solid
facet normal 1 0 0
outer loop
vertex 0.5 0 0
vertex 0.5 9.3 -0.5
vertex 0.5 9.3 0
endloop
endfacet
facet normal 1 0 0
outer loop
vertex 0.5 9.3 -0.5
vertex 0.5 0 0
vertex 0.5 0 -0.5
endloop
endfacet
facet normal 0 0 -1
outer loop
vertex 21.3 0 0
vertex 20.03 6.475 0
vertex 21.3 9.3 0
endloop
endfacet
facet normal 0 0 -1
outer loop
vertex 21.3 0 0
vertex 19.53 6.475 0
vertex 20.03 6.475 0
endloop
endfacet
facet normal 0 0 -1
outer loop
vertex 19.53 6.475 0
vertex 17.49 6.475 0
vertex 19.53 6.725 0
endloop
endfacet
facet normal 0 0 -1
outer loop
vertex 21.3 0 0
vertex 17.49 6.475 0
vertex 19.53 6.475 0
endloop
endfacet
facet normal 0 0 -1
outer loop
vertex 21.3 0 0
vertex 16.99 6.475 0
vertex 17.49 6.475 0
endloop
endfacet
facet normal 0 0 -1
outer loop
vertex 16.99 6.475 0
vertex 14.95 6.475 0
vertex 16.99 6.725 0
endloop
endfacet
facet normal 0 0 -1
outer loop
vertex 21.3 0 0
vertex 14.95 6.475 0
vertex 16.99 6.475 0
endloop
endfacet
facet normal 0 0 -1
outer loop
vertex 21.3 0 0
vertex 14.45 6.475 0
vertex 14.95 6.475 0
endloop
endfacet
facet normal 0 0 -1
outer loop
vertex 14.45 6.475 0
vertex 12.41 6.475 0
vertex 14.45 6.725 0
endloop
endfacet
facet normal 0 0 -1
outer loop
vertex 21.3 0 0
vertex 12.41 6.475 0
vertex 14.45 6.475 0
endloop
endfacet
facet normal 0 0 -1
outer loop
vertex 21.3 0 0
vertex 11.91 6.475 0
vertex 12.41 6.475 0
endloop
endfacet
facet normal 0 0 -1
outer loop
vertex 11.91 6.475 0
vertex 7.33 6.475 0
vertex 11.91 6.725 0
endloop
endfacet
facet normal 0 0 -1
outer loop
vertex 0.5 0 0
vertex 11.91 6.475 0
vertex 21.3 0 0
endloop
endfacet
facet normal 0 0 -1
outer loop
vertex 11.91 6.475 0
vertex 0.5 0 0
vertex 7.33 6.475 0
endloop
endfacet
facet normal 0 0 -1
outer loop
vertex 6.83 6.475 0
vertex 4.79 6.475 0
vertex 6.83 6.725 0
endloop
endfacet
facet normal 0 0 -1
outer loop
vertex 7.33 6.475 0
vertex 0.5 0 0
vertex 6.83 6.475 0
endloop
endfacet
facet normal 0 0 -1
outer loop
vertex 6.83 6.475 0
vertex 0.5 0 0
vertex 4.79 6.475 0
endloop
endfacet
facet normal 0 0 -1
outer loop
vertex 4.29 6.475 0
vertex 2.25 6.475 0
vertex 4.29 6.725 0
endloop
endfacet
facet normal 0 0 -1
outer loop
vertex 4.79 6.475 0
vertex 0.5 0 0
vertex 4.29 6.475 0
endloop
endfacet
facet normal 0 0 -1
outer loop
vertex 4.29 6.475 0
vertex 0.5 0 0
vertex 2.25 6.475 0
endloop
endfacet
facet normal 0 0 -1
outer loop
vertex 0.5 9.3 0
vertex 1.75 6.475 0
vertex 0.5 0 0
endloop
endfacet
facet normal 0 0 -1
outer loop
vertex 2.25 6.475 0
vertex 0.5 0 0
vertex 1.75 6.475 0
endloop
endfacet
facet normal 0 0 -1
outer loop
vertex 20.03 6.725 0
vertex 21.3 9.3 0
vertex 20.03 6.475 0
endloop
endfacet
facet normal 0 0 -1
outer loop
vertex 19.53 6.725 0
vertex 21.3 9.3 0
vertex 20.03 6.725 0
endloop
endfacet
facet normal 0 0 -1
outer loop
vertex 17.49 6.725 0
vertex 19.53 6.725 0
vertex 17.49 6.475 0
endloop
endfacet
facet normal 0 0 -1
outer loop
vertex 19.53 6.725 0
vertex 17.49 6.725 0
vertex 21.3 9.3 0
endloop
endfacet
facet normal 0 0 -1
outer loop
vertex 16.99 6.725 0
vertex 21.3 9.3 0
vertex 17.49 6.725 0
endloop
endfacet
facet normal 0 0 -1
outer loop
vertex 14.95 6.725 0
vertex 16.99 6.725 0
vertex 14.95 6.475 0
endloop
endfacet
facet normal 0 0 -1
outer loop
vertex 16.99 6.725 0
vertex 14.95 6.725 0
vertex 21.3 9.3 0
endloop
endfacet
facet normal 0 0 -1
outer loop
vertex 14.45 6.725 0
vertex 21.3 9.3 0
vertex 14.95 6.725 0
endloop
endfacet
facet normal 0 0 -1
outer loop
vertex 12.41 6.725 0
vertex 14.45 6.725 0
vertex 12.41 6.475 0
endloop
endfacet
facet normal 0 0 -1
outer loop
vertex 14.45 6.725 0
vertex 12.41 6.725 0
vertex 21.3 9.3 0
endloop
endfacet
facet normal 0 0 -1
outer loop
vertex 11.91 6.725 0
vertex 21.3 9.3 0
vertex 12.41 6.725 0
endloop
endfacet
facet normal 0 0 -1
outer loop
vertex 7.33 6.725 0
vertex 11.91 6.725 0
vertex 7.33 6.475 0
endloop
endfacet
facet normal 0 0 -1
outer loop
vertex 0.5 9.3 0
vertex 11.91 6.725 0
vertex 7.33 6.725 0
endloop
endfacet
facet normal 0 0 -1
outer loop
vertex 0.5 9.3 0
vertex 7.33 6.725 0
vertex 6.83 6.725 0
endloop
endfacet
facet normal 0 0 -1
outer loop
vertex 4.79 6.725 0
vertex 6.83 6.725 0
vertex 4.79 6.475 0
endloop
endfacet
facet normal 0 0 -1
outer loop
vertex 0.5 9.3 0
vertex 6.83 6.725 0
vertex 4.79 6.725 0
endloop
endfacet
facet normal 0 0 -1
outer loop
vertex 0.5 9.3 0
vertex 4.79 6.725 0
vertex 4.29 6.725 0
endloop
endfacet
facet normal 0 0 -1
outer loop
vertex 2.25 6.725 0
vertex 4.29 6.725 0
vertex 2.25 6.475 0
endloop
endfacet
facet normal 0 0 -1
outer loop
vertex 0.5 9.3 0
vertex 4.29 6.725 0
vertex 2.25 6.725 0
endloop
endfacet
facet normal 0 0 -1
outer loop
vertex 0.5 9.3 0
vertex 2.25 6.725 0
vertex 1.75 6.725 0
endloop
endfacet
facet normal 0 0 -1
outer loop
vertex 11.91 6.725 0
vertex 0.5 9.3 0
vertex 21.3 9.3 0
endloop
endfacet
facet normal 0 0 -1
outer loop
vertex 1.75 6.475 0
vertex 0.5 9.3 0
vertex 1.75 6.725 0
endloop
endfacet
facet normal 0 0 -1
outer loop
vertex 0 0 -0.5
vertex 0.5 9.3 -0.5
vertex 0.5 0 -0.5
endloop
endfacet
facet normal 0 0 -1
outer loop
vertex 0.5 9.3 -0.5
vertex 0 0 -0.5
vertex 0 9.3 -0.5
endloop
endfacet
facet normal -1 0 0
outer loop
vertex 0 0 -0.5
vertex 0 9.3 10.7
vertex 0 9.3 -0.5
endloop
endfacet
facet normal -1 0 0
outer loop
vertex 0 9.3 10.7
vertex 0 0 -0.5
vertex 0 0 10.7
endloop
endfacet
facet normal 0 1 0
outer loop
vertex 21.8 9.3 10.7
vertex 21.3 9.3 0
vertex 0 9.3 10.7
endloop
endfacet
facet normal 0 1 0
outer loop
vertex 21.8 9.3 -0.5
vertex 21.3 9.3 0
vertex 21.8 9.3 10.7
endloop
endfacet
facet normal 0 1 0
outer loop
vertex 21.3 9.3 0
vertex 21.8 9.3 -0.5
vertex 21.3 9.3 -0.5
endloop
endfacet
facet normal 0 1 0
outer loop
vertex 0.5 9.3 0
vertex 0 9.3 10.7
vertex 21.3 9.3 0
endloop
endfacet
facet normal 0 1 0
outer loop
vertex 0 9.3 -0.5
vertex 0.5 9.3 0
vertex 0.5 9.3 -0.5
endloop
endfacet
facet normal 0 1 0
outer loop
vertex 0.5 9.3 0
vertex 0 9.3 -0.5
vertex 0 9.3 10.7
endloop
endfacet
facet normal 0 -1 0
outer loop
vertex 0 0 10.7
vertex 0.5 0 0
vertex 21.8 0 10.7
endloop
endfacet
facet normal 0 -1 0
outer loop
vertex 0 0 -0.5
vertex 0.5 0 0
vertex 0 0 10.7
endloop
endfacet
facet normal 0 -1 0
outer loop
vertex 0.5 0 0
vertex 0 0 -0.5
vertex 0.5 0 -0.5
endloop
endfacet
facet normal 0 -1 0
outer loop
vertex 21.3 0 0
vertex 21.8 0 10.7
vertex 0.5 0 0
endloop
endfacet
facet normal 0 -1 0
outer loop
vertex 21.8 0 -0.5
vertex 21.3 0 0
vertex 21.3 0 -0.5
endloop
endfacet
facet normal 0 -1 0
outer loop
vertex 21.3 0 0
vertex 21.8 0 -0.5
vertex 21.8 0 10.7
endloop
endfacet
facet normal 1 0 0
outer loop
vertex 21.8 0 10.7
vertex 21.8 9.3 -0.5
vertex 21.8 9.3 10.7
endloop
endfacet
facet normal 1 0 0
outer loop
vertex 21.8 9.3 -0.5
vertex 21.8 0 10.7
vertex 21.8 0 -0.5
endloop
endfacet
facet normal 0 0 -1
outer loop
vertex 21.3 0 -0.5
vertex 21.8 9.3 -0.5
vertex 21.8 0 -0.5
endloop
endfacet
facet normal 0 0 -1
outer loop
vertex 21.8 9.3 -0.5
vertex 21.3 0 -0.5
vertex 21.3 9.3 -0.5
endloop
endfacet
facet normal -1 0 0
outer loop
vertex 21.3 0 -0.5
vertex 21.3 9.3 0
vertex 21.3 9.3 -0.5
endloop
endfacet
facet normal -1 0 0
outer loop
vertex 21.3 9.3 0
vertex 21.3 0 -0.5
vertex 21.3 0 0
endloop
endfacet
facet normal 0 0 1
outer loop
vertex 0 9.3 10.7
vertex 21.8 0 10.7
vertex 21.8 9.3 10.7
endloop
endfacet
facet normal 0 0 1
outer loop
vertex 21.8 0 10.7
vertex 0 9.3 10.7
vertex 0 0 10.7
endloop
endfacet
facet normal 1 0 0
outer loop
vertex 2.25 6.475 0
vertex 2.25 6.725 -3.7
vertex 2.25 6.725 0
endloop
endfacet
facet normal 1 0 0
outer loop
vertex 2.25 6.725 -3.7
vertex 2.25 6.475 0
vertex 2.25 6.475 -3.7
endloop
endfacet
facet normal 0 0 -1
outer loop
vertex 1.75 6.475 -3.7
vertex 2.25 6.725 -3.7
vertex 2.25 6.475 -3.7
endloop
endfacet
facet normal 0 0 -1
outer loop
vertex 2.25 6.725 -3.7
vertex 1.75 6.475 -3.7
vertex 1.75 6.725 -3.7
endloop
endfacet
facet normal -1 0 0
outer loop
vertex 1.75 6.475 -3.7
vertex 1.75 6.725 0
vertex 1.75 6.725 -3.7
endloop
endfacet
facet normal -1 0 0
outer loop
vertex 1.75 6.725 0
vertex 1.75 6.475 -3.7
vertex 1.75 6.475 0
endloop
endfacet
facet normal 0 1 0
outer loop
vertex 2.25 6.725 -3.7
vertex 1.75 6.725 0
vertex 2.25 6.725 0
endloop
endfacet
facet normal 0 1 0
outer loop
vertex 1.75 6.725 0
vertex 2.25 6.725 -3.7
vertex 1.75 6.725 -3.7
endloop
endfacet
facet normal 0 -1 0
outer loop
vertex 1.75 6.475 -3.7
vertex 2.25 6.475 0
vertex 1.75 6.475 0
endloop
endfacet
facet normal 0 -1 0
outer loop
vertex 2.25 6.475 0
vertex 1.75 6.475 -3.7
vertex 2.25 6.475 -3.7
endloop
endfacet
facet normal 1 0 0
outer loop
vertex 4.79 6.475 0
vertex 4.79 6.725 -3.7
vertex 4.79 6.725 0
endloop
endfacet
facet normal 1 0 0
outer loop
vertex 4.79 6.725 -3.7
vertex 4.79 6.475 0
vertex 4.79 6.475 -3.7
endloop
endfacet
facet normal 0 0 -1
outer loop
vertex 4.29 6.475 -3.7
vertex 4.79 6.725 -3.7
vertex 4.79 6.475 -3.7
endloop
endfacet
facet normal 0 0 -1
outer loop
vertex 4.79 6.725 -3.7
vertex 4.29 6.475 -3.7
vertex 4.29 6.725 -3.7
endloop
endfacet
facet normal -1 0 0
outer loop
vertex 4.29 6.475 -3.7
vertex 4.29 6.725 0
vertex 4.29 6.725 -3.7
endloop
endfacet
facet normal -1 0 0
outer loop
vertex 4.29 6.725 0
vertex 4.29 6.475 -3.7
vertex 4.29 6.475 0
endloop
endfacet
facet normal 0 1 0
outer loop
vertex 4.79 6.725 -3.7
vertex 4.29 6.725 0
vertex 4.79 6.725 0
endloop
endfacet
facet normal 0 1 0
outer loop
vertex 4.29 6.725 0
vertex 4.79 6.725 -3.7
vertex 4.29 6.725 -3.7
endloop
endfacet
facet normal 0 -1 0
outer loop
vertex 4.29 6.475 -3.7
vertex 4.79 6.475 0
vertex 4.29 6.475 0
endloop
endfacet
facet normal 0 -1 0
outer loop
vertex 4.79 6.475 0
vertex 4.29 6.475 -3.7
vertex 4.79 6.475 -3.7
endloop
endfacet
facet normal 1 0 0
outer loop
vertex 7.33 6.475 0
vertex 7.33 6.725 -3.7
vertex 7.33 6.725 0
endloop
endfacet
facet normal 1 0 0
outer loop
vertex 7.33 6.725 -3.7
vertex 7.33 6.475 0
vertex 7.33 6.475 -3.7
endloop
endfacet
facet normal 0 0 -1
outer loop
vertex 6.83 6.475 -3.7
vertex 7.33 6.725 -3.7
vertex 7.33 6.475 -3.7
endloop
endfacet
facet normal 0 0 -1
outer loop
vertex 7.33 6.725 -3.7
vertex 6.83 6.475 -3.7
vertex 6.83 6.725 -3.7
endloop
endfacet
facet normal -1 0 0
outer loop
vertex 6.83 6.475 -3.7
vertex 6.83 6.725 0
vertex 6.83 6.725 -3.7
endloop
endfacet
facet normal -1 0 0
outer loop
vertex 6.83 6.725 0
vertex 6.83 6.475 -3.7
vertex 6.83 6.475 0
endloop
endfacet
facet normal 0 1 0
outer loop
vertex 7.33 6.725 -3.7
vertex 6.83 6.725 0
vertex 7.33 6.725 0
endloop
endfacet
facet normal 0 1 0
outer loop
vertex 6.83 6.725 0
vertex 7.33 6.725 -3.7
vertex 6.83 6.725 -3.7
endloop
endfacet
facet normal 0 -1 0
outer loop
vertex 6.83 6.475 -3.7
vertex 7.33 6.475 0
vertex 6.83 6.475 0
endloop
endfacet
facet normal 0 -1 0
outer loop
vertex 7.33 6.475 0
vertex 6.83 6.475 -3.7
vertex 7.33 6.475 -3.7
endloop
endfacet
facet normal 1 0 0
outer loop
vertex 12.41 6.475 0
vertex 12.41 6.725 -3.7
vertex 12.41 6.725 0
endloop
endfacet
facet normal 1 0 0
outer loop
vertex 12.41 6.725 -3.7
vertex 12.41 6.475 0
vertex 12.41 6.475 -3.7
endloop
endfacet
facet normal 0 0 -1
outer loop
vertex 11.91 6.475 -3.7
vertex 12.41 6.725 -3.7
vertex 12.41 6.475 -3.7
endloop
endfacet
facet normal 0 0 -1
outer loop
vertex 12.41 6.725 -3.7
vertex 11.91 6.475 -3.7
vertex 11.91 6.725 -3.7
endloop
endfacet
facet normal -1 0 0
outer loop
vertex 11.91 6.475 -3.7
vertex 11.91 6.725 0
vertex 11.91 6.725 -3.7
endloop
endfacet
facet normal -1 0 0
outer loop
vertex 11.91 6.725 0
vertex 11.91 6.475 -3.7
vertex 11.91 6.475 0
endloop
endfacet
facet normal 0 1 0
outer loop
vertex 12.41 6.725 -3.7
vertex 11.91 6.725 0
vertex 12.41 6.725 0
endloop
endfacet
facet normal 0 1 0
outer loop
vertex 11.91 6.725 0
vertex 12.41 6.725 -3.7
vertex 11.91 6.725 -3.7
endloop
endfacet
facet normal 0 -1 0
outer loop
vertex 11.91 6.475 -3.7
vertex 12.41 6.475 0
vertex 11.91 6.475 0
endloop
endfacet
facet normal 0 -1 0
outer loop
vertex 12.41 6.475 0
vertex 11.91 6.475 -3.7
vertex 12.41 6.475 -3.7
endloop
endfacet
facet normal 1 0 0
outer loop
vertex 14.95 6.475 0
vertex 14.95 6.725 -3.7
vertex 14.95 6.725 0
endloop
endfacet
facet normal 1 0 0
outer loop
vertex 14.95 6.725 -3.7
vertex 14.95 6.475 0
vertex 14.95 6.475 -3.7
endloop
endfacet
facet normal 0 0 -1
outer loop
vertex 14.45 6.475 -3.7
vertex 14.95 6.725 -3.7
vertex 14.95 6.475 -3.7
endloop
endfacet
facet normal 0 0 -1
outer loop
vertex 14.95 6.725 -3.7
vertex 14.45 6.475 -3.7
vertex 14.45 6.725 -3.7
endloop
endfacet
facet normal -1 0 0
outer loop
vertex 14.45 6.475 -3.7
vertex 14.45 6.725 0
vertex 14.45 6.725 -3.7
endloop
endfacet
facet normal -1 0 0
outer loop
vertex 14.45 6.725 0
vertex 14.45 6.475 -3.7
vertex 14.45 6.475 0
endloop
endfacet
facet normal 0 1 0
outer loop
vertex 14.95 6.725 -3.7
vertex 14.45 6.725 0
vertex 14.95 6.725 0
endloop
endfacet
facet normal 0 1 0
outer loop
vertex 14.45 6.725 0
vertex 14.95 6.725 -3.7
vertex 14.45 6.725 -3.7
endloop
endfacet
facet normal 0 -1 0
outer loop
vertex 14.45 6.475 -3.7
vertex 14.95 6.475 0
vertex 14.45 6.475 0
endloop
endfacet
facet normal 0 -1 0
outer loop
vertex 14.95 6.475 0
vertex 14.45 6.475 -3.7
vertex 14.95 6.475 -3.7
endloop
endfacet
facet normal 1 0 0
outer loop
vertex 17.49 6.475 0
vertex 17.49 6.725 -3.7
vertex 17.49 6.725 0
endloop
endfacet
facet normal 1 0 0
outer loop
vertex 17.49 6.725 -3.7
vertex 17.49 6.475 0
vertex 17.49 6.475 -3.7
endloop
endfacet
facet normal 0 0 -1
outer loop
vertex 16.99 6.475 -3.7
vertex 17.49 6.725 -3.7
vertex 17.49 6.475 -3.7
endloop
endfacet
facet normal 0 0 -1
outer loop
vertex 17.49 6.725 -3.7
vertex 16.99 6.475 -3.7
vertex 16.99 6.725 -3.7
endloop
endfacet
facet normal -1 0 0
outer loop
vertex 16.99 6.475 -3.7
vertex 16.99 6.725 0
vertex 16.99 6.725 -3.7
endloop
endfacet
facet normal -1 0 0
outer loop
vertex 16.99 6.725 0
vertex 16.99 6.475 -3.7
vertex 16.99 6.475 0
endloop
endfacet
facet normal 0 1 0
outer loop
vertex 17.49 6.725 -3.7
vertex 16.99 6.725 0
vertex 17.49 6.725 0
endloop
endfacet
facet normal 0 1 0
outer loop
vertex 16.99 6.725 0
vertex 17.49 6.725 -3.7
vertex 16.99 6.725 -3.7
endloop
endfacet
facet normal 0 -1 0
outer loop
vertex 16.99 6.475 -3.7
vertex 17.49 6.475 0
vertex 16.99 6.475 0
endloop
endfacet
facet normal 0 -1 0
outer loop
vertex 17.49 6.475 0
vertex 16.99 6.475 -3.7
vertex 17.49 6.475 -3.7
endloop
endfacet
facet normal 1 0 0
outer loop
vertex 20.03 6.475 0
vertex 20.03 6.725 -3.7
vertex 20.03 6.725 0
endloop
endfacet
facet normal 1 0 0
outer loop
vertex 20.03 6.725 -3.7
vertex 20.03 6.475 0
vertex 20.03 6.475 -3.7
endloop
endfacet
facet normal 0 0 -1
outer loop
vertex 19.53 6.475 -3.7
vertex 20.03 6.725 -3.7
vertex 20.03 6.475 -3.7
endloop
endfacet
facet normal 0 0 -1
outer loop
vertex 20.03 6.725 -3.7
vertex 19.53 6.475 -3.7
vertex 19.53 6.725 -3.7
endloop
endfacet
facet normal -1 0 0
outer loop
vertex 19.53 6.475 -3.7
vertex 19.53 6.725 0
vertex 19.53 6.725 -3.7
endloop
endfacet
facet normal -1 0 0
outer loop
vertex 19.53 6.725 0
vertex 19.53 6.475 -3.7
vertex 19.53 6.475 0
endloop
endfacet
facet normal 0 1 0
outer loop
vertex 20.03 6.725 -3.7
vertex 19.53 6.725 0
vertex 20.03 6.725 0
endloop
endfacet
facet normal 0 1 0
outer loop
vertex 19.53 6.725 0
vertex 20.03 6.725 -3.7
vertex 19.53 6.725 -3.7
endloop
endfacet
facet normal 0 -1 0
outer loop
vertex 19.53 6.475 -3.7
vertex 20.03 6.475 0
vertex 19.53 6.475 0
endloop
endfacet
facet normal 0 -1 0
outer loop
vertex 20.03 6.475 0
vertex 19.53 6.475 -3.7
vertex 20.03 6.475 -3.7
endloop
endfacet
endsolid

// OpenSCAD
CASE = [21.8, 9.3, 11.2 - 0.5];
STANDOFF = [0.5, CASE[1], 0.5];
PIN = [0.5, 0.25, 3.7];

CASE_COLOR = "black";
PIN_COLOR = "silver";

union() {
    color(CASE_COLOR) {
        cube(CASE);
        for (i = [0, 1]) {
            translate([(CASE[0] - STANDOFF[0]) * i, 0, -STANDOFF[2]]) {
                cube(STANDOFF);
            }
        }
    }
    for (i = [0, 1, 2, 4, 5, 6, 7]) {
        translate([2 + 2.54 * i - PIN[0] / 2, CASE[1] - 2.7 - PIN[1] / 2, -PIN[2]]) {
            color(PIN_COLOR) {
                cube(PIN);
            }
        }
    }
}
